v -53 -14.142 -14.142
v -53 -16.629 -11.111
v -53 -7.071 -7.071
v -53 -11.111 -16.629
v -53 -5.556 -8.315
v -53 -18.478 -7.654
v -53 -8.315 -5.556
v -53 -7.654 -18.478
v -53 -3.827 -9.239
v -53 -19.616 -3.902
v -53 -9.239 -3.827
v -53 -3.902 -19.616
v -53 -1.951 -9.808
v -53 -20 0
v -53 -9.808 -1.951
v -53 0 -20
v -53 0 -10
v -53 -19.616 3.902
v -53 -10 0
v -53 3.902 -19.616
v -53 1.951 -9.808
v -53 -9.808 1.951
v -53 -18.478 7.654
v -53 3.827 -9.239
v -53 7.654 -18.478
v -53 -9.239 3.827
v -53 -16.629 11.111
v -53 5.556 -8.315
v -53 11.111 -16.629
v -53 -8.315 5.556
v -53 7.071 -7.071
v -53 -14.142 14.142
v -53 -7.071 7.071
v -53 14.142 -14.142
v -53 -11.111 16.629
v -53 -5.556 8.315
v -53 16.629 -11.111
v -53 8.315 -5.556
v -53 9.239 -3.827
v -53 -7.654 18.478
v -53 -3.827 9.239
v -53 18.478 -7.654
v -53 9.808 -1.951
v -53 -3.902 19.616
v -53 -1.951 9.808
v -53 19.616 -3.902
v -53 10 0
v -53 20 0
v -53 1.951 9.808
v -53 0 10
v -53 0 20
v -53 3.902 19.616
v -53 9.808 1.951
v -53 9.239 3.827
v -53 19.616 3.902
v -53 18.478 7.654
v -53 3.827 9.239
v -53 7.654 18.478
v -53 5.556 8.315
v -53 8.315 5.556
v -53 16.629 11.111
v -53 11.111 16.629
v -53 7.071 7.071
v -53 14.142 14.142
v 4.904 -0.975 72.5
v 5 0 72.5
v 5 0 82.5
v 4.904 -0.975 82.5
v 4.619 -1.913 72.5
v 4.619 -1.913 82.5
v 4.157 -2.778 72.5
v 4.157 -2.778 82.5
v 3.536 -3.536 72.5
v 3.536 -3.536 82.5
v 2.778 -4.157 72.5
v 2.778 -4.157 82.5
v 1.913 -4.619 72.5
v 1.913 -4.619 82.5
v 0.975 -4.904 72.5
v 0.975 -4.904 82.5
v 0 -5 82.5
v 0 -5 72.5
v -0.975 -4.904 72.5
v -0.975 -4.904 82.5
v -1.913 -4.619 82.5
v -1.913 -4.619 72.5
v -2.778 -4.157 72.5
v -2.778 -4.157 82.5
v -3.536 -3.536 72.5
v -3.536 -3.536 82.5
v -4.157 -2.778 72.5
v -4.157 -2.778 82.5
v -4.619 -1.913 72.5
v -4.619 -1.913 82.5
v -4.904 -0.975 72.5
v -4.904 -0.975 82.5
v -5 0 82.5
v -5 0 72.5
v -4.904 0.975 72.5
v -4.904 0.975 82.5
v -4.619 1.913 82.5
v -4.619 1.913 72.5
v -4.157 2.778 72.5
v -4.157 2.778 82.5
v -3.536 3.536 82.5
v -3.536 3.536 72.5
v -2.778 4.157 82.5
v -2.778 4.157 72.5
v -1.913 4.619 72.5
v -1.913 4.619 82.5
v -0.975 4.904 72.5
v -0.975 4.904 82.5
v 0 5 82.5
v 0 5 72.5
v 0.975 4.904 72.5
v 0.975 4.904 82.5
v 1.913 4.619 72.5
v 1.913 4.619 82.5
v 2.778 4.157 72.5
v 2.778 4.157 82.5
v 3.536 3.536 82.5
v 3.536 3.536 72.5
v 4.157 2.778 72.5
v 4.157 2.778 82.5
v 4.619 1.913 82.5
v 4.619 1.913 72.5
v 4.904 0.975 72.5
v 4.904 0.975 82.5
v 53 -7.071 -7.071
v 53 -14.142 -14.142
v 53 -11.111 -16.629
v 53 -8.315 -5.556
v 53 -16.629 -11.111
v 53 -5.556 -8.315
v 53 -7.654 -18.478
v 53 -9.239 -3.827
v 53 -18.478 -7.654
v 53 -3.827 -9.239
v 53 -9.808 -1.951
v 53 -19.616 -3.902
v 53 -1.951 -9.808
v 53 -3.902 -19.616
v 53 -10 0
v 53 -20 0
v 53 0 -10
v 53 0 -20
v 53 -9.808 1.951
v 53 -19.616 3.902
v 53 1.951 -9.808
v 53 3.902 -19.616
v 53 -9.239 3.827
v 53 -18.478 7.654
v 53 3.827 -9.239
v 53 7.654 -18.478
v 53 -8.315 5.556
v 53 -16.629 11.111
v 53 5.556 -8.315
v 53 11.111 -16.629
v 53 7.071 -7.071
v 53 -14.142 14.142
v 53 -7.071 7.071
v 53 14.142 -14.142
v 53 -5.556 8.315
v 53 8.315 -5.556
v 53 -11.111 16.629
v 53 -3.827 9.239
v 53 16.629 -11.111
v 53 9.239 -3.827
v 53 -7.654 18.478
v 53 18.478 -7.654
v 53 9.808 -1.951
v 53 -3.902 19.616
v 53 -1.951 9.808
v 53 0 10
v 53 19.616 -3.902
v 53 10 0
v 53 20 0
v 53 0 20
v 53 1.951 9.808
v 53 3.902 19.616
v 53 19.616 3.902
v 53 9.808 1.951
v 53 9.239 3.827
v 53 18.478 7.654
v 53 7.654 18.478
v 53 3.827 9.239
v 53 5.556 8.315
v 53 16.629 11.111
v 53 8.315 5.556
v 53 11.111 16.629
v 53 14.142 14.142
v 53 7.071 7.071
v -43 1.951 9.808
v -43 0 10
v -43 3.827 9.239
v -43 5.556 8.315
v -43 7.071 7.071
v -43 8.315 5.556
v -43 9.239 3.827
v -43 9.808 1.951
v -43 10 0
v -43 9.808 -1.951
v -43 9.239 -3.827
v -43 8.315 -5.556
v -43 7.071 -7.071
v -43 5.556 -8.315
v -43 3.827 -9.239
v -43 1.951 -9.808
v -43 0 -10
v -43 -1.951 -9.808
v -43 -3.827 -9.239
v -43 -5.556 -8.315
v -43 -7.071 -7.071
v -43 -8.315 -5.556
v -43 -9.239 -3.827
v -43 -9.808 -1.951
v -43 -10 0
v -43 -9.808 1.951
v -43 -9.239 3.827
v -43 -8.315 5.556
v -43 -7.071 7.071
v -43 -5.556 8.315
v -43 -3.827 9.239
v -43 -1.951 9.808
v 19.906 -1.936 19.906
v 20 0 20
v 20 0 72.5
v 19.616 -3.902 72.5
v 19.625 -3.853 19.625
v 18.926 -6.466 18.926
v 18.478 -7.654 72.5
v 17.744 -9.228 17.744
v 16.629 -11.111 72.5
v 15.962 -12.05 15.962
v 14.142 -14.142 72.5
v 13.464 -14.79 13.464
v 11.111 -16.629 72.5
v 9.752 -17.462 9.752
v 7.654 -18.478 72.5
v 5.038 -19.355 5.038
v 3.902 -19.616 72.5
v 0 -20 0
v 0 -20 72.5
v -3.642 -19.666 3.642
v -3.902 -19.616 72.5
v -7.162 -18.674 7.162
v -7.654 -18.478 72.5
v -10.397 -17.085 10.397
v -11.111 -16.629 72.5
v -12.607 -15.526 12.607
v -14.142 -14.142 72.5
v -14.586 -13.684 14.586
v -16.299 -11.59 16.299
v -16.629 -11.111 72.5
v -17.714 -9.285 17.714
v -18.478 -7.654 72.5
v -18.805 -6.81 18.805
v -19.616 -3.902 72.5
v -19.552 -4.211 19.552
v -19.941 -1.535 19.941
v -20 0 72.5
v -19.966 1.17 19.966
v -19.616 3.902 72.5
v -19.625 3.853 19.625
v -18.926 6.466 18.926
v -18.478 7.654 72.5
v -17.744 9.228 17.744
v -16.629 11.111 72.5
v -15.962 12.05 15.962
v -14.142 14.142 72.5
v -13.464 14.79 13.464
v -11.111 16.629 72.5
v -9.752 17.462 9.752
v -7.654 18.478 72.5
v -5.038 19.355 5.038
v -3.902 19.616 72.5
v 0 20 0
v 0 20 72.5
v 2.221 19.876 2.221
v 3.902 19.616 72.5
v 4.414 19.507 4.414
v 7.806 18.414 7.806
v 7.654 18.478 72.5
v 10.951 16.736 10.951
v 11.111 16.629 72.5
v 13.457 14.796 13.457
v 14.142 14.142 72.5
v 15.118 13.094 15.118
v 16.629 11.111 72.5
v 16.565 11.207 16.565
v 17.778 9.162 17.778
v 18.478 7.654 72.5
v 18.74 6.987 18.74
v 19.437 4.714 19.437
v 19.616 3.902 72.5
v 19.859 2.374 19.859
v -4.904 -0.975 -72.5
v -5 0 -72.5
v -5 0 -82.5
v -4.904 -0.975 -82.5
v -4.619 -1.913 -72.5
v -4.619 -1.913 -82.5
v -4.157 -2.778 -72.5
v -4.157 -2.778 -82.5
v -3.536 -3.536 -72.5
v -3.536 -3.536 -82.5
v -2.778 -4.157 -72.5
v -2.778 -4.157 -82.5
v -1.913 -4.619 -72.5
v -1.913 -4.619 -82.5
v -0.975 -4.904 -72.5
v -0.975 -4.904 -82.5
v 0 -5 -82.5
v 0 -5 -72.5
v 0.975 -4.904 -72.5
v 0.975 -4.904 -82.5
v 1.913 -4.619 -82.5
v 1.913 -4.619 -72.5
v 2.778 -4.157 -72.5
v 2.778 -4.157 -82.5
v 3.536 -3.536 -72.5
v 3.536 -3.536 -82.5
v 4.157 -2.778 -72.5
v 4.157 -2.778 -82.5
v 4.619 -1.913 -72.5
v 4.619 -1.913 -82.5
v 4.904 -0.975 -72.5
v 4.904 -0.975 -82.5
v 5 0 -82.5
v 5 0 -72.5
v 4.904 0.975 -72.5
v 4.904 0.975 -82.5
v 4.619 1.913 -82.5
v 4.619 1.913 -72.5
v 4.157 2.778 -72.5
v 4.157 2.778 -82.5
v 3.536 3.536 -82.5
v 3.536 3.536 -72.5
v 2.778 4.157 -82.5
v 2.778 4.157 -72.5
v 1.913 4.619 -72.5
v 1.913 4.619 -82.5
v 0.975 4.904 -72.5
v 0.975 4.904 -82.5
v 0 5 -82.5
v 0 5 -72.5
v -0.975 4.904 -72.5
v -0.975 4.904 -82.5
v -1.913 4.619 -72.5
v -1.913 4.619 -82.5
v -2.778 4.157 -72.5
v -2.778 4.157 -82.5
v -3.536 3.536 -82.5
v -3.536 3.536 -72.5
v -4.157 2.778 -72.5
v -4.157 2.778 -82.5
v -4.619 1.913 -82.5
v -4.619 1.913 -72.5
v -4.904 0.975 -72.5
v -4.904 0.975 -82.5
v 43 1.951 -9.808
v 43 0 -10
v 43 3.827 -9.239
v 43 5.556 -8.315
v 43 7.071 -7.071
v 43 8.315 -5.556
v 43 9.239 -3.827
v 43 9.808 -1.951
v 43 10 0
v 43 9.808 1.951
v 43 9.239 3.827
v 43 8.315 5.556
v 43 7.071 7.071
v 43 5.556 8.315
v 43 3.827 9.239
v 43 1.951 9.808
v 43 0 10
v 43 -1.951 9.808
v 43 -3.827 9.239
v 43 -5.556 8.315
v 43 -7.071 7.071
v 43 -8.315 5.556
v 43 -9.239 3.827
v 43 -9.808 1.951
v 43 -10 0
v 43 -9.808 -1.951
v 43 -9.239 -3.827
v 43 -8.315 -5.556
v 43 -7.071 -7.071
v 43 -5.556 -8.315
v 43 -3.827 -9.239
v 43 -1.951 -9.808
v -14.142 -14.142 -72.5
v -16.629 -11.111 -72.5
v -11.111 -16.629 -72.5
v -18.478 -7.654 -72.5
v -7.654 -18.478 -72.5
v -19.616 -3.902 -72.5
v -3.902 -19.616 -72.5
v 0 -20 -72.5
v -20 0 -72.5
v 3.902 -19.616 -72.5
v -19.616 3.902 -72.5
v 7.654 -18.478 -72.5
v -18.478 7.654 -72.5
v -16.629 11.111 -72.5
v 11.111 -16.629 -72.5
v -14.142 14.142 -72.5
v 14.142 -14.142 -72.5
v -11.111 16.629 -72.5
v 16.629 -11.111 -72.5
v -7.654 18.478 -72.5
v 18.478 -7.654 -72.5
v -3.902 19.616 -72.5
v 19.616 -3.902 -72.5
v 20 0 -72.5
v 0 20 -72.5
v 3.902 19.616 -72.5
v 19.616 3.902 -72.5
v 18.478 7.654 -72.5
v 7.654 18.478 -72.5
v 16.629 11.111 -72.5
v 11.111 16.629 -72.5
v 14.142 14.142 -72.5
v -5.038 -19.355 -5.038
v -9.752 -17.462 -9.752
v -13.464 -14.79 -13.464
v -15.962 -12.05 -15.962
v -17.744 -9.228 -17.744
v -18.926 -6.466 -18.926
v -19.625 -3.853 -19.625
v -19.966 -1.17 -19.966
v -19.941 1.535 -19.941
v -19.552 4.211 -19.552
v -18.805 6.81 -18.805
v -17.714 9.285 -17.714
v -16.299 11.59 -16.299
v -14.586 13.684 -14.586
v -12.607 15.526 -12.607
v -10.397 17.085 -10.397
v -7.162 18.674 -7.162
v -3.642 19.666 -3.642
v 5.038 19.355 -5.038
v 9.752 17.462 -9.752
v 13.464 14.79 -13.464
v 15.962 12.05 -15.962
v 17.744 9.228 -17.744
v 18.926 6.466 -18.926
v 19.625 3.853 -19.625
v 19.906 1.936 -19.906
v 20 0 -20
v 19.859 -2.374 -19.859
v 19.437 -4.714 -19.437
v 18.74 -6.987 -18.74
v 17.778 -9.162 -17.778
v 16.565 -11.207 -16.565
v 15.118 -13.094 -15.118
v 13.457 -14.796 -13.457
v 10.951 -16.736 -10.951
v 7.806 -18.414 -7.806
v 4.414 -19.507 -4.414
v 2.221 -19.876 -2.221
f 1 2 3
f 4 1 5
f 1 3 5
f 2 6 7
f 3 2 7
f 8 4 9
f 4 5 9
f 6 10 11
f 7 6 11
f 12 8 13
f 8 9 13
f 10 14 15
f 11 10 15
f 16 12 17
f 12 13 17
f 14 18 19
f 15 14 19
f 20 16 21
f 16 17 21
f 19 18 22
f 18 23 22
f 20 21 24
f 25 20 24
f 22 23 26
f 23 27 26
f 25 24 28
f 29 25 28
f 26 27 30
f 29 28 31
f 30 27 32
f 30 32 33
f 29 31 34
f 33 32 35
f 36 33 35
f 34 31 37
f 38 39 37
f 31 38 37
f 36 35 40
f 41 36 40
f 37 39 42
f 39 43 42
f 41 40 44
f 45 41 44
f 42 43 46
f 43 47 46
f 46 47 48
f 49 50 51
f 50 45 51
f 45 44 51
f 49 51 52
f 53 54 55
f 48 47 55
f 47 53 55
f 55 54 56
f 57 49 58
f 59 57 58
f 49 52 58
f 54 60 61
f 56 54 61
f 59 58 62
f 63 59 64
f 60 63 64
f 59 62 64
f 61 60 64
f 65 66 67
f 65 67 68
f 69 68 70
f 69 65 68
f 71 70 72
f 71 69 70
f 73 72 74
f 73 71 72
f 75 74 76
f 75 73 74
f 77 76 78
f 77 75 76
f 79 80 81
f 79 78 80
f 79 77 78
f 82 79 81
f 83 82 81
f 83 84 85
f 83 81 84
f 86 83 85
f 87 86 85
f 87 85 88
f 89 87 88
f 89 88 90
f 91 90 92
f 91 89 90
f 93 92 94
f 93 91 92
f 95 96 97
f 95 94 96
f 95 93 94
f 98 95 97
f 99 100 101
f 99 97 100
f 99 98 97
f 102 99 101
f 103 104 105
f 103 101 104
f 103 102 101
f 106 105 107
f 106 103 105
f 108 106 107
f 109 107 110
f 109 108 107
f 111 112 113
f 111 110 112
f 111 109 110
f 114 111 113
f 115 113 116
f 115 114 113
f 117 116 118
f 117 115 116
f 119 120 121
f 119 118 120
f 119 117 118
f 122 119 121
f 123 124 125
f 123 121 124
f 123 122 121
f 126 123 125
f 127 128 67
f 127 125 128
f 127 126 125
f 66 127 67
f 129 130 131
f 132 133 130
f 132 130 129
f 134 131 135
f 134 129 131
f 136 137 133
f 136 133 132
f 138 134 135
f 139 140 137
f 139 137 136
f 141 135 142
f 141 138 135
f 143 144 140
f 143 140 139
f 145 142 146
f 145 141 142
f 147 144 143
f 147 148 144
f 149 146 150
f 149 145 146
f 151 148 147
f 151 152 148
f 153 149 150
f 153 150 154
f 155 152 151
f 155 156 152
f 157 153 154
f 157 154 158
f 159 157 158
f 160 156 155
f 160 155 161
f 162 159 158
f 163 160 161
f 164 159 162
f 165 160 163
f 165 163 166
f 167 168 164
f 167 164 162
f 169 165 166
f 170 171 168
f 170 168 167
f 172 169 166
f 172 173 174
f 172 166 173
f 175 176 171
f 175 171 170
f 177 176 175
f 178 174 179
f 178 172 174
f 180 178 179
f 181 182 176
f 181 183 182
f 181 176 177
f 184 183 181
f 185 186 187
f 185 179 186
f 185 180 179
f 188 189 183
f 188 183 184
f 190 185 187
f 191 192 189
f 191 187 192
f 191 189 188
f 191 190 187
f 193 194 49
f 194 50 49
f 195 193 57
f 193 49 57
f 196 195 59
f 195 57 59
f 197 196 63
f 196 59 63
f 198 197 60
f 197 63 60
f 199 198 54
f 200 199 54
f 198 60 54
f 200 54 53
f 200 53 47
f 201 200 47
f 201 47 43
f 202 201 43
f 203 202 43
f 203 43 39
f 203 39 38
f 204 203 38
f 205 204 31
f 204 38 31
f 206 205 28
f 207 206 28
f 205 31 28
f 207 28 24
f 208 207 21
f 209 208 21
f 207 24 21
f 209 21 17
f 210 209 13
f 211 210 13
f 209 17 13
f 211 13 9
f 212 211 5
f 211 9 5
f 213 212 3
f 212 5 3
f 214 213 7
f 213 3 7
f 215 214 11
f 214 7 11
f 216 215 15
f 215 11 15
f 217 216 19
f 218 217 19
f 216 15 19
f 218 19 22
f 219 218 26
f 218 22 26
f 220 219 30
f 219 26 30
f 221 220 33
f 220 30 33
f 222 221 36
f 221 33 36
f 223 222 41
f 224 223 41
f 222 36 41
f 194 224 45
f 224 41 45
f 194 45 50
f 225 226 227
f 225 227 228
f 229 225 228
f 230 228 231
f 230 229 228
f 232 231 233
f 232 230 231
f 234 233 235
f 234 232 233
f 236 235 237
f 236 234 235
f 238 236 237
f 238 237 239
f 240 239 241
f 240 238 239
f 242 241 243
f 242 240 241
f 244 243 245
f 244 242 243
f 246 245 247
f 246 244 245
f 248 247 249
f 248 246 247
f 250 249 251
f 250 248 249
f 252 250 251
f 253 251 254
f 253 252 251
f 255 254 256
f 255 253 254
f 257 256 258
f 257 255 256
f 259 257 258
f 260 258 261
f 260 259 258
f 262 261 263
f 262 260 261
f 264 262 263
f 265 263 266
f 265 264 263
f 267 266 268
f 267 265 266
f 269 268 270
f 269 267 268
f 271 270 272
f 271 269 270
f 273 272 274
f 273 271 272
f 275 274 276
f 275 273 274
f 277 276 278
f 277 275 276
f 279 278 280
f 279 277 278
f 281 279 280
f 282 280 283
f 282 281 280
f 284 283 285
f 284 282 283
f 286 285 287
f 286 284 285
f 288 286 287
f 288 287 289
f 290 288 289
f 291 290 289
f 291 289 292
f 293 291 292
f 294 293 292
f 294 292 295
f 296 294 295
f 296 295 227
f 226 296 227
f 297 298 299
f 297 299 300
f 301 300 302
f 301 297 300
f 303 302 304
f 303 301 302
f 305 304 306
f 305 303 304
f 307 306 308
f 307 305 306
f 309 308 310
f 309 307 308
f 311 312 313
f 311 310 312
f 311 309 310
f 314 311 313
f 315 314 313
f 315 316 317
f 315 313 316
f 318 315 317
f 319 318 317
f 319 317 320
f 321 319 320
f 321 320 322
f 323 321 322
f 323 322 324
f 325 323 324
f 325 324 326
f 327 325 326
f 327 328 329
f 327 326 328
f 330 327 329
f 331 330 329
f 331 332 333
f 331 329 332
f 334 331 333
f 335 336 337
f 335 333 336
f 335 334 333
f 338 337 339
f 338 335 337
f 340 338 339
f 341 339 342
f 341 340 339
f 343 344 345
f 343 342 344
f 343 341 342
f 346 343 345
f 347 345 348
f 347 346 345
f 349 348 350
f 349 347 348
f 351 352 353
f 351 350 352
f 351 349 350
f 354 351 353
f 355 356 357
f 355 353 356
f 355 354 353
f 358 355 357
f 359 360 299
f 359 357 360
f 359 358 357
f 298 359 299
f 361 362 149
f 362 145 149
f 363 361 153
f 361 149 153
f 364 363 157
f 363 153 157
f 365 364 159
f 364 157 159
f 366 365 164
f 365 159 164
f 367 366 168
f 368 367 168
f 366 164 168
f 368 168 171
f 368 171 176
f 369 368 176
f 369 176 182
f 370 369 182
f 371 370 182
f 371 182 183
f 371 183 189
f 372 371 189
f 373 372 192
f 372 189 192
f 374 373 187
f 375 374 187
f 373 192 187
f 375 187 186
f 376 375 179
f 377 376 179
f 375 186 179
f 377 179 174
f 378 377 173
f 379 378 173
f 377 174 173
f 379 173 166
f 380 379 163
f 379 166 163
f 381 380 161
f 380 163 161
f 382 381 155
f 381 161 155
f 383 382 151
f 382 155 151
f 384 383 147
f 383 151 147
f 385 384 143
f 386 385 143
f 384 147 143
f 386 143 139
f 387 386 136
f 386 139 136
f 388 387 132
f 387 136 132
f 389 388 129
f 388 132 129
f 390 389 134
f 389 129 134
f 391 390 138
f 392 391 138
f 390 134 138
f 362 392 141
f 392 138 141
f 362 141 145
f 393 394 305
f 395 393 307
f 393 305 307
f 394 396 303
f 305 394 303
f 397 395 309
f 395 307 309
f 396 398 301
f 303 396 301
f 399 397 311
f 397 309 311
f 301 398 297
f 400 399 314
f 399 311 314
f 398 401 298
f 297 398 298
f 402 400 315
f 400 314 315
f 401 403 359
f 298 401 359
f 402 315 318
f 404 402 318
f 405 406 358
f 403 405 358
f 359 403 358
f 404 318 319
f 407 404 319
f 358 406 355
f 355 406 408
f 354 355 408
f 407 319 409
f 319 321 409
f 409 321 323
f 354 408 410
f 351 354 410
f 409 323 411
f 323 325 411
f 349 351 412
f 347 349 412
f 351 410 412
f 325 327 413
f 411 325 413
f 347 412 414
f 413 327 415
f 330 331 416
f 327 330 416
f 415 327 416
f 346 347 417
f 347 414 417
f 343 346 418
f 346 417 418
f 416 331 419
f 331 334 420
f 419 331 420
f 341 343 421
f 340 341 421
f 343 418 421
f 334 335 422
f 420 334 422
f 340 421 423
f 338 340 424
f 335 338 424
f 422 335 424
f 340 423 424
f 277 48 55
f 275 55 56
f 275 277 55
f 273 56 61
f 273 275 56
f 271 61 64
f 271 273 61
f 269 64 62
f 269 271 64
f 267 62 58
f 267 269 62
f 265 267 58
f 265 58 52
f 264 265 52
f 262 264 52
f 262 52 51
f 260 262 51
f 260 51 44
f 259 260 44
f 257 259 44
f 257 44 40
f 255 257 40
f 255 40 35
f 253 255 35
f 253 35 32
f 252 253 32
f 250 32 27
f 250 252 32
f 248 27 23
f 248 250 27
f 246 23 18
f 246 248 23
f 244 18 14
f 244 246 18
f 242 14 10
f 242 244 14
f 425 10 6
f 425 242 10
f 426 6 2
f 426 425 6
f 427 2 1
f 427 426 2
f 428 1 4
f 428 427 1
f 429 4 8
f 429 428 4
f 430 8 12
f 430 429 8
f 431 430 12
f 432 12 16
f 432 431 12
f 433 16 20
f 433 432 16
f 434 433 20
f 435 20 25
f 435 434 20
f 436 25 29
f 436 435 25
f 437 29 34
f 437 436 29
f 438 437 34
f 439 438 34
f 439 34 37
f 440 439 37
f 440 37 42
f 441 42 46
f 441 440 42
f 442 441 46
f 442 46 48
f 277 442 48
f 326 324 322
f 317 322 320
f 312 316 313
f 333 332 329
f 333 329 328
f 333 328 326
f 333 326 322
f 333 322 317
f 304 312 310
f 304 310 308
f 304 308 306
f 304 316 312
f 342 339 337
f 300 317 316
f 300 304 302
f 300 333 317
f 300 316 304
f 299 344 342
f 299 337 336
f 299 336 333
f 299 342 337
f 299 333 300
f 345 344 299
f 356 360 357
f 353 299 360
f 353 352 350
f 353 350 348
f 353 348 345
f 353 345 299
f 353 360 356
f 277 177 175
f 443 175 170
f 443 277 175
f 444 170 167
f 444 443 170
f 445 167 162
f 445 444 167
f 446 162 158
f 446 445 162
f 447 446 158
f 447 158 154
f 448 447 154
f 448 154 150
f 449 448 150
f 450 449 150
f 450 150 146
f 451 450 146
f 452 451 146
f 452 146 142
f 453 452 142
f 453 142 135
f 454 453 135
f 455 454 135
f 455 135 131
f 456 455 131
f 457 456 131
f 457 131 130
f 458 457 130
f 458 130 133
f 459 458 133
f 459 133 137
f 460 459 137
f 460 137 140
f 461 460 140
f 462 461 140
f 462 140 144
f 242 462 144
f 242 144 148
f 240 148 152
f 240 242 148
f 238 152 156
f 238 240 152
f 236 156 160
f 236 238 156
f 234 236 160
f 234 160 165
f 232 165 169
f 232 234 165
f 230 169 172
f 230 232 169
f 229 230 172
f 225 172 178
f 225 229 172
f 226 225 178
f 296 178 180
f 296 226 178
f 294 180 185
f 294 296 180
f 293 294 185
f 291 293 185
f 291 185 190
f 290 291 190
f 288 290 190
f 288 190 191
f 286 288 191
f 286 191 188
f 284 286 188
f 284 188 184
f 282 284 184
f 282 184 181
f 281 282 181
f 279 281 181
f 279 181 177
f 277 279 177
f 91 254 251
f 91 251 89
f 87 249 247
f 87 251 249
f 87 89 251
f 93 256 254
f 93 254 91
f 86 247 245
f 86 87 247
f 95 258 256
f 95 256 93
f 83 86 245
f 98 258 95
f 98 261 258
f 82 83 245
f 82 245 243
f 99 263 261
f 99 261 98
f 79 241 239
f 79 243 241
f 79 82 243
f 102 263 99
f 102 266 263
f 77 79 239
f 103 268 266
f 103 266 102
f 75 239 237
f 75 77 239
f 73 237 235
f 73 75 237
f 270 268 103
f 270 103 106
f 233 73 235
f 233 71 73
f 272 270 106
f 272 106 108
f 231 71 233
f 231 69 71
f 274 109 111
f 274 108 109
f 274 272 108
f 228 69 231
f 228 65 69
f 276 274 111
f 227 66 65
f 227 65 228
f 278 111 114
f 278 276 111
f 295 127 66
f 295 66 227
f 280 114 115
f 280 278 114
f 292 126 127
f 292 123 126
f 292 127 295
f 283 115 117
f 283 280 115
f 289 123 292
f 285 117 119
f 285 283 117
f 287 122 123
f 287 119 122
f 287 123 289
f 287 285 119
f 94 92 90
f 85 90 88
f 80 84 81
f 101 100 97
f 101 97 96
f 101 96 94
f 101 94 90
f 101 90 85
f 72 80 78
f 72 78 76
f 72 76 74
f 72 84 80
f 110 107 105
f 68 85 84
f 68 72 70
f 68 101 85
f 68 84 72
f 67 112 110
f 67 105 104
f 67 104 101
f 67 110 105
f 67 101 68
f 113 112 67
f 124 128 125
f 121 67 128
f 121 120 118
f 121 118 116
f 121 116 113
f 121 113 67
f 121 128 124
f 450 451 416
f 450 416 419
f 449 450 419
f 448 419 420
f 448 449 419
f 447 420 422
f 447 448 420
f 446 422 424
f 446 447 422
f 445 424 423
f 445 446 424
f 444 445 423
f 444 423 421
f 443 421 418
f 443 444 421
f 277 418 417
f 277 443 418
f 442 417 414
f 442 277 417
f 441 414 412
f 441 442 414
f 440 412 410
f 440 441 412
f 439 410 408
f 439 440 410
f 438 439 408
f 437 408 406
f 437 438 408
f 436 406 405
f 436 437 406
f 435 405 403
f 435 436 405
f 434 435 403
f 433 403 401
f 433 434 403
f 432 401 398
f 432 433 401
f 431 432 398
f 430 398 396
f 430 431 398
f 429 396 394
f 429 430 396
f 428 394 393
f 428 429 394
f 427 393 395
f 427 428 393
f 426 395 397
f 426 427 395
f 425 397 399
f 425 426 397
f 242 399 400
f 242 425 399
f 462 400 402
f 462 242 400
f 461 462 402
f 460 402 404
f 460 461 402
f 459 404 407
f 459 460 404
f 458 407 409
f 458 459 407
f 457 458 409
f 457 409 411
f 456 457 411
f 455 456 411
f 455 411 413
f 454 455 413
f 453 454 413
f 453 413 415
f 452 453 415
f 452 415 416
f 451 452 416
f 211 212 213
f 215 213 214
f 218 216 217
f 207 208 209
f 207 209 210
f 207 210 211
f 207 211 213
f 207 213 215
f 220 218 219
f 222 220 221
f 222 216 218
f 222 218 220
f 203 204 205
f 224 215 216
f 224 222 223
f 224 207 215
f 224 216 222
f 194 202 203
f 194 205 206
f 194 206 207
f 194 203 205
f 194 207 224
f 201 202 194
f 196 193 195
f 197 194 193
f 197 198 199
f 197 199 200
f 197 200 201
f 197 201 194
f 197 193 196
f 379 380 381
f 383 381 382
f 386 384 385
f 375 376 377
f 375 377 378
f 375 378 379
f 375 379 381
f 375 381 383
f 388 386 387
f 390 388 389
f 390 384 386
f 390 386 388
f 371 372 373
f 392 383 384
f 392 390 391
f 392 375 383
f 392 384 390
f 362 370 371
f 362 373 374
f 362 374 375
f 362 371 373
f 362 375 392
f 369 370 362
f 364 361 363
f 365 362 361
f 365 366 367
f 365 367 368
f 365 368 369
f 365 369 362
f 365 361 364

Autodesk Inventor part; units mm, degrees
ref_plane "YZ Plane" through (0, 0, 0) normal (1, 0, 0) x (0, 1, 0)
ref_plane "XZ Plane" through (0, 0, 0) normal (0, 1, 0) x (-1, 0, 0)
ref_plane "XY Plane" through (0, 0, 0) normal (0, 0, 1) x (1, 0, 0)
sketch "Sketch1" plane through (0, 0, 0) normal (1, 0, 0) x (0, 1, 0)
  circle A0 centre (0, 0) radius 20
  dimension "d0" = 40
extrude "Extrusion1" add sketch "Sketch1" along normal mid plane 106
sketch "Sketch2" plane through (53, 0, 0) normal (1, 0, 0) x (0, 0, -1)
  circle A0 centre (0, 0) radius 10
  dimension "d3" = 20
extrude "Extrusion2" cut sketch "Sketch2" against normal blind 10
sketch "Sketch3" plane through (-53, 0, 0) normal (-1, 0, 0) x (0, 0, 1)
  circle A0 centre (0, 0) radius 10
  dimension "d6" = 20
extrude "Extrusion3" cut sketch "Sketch3" against normal blind 10
sketch "Sketch5" plane through (0, 0, 0) normal (0, 0, 1) x (1, 0, 0)
  circle A0 centre (0, 0) radius 20
  line L0 (-53, 20) -> (53, 20) projected
extrude "Extrusion4" add sketch "Sketch5" along normal mid plane 145
sketch "Sketch6" plane through (0, 0, 72.5) normal (0, 0, 1) x (1, 0, 0)
  circle A0 centre (0, 0) radius 5
  dimension "d12" = 10
extrude "Extrusion5" add sketch "Sketch6" along normal blind 10
sketch "Sketch7" plane through (0, 0, -72.5) normal (0, 0, -1) x (-1, 0, 0)
  circle A0 centre (0, 0) radius 5
extrude "Extrusion6" add sketch "Sketch7" along normal blind 10
properties part number "AERO - Arm"
